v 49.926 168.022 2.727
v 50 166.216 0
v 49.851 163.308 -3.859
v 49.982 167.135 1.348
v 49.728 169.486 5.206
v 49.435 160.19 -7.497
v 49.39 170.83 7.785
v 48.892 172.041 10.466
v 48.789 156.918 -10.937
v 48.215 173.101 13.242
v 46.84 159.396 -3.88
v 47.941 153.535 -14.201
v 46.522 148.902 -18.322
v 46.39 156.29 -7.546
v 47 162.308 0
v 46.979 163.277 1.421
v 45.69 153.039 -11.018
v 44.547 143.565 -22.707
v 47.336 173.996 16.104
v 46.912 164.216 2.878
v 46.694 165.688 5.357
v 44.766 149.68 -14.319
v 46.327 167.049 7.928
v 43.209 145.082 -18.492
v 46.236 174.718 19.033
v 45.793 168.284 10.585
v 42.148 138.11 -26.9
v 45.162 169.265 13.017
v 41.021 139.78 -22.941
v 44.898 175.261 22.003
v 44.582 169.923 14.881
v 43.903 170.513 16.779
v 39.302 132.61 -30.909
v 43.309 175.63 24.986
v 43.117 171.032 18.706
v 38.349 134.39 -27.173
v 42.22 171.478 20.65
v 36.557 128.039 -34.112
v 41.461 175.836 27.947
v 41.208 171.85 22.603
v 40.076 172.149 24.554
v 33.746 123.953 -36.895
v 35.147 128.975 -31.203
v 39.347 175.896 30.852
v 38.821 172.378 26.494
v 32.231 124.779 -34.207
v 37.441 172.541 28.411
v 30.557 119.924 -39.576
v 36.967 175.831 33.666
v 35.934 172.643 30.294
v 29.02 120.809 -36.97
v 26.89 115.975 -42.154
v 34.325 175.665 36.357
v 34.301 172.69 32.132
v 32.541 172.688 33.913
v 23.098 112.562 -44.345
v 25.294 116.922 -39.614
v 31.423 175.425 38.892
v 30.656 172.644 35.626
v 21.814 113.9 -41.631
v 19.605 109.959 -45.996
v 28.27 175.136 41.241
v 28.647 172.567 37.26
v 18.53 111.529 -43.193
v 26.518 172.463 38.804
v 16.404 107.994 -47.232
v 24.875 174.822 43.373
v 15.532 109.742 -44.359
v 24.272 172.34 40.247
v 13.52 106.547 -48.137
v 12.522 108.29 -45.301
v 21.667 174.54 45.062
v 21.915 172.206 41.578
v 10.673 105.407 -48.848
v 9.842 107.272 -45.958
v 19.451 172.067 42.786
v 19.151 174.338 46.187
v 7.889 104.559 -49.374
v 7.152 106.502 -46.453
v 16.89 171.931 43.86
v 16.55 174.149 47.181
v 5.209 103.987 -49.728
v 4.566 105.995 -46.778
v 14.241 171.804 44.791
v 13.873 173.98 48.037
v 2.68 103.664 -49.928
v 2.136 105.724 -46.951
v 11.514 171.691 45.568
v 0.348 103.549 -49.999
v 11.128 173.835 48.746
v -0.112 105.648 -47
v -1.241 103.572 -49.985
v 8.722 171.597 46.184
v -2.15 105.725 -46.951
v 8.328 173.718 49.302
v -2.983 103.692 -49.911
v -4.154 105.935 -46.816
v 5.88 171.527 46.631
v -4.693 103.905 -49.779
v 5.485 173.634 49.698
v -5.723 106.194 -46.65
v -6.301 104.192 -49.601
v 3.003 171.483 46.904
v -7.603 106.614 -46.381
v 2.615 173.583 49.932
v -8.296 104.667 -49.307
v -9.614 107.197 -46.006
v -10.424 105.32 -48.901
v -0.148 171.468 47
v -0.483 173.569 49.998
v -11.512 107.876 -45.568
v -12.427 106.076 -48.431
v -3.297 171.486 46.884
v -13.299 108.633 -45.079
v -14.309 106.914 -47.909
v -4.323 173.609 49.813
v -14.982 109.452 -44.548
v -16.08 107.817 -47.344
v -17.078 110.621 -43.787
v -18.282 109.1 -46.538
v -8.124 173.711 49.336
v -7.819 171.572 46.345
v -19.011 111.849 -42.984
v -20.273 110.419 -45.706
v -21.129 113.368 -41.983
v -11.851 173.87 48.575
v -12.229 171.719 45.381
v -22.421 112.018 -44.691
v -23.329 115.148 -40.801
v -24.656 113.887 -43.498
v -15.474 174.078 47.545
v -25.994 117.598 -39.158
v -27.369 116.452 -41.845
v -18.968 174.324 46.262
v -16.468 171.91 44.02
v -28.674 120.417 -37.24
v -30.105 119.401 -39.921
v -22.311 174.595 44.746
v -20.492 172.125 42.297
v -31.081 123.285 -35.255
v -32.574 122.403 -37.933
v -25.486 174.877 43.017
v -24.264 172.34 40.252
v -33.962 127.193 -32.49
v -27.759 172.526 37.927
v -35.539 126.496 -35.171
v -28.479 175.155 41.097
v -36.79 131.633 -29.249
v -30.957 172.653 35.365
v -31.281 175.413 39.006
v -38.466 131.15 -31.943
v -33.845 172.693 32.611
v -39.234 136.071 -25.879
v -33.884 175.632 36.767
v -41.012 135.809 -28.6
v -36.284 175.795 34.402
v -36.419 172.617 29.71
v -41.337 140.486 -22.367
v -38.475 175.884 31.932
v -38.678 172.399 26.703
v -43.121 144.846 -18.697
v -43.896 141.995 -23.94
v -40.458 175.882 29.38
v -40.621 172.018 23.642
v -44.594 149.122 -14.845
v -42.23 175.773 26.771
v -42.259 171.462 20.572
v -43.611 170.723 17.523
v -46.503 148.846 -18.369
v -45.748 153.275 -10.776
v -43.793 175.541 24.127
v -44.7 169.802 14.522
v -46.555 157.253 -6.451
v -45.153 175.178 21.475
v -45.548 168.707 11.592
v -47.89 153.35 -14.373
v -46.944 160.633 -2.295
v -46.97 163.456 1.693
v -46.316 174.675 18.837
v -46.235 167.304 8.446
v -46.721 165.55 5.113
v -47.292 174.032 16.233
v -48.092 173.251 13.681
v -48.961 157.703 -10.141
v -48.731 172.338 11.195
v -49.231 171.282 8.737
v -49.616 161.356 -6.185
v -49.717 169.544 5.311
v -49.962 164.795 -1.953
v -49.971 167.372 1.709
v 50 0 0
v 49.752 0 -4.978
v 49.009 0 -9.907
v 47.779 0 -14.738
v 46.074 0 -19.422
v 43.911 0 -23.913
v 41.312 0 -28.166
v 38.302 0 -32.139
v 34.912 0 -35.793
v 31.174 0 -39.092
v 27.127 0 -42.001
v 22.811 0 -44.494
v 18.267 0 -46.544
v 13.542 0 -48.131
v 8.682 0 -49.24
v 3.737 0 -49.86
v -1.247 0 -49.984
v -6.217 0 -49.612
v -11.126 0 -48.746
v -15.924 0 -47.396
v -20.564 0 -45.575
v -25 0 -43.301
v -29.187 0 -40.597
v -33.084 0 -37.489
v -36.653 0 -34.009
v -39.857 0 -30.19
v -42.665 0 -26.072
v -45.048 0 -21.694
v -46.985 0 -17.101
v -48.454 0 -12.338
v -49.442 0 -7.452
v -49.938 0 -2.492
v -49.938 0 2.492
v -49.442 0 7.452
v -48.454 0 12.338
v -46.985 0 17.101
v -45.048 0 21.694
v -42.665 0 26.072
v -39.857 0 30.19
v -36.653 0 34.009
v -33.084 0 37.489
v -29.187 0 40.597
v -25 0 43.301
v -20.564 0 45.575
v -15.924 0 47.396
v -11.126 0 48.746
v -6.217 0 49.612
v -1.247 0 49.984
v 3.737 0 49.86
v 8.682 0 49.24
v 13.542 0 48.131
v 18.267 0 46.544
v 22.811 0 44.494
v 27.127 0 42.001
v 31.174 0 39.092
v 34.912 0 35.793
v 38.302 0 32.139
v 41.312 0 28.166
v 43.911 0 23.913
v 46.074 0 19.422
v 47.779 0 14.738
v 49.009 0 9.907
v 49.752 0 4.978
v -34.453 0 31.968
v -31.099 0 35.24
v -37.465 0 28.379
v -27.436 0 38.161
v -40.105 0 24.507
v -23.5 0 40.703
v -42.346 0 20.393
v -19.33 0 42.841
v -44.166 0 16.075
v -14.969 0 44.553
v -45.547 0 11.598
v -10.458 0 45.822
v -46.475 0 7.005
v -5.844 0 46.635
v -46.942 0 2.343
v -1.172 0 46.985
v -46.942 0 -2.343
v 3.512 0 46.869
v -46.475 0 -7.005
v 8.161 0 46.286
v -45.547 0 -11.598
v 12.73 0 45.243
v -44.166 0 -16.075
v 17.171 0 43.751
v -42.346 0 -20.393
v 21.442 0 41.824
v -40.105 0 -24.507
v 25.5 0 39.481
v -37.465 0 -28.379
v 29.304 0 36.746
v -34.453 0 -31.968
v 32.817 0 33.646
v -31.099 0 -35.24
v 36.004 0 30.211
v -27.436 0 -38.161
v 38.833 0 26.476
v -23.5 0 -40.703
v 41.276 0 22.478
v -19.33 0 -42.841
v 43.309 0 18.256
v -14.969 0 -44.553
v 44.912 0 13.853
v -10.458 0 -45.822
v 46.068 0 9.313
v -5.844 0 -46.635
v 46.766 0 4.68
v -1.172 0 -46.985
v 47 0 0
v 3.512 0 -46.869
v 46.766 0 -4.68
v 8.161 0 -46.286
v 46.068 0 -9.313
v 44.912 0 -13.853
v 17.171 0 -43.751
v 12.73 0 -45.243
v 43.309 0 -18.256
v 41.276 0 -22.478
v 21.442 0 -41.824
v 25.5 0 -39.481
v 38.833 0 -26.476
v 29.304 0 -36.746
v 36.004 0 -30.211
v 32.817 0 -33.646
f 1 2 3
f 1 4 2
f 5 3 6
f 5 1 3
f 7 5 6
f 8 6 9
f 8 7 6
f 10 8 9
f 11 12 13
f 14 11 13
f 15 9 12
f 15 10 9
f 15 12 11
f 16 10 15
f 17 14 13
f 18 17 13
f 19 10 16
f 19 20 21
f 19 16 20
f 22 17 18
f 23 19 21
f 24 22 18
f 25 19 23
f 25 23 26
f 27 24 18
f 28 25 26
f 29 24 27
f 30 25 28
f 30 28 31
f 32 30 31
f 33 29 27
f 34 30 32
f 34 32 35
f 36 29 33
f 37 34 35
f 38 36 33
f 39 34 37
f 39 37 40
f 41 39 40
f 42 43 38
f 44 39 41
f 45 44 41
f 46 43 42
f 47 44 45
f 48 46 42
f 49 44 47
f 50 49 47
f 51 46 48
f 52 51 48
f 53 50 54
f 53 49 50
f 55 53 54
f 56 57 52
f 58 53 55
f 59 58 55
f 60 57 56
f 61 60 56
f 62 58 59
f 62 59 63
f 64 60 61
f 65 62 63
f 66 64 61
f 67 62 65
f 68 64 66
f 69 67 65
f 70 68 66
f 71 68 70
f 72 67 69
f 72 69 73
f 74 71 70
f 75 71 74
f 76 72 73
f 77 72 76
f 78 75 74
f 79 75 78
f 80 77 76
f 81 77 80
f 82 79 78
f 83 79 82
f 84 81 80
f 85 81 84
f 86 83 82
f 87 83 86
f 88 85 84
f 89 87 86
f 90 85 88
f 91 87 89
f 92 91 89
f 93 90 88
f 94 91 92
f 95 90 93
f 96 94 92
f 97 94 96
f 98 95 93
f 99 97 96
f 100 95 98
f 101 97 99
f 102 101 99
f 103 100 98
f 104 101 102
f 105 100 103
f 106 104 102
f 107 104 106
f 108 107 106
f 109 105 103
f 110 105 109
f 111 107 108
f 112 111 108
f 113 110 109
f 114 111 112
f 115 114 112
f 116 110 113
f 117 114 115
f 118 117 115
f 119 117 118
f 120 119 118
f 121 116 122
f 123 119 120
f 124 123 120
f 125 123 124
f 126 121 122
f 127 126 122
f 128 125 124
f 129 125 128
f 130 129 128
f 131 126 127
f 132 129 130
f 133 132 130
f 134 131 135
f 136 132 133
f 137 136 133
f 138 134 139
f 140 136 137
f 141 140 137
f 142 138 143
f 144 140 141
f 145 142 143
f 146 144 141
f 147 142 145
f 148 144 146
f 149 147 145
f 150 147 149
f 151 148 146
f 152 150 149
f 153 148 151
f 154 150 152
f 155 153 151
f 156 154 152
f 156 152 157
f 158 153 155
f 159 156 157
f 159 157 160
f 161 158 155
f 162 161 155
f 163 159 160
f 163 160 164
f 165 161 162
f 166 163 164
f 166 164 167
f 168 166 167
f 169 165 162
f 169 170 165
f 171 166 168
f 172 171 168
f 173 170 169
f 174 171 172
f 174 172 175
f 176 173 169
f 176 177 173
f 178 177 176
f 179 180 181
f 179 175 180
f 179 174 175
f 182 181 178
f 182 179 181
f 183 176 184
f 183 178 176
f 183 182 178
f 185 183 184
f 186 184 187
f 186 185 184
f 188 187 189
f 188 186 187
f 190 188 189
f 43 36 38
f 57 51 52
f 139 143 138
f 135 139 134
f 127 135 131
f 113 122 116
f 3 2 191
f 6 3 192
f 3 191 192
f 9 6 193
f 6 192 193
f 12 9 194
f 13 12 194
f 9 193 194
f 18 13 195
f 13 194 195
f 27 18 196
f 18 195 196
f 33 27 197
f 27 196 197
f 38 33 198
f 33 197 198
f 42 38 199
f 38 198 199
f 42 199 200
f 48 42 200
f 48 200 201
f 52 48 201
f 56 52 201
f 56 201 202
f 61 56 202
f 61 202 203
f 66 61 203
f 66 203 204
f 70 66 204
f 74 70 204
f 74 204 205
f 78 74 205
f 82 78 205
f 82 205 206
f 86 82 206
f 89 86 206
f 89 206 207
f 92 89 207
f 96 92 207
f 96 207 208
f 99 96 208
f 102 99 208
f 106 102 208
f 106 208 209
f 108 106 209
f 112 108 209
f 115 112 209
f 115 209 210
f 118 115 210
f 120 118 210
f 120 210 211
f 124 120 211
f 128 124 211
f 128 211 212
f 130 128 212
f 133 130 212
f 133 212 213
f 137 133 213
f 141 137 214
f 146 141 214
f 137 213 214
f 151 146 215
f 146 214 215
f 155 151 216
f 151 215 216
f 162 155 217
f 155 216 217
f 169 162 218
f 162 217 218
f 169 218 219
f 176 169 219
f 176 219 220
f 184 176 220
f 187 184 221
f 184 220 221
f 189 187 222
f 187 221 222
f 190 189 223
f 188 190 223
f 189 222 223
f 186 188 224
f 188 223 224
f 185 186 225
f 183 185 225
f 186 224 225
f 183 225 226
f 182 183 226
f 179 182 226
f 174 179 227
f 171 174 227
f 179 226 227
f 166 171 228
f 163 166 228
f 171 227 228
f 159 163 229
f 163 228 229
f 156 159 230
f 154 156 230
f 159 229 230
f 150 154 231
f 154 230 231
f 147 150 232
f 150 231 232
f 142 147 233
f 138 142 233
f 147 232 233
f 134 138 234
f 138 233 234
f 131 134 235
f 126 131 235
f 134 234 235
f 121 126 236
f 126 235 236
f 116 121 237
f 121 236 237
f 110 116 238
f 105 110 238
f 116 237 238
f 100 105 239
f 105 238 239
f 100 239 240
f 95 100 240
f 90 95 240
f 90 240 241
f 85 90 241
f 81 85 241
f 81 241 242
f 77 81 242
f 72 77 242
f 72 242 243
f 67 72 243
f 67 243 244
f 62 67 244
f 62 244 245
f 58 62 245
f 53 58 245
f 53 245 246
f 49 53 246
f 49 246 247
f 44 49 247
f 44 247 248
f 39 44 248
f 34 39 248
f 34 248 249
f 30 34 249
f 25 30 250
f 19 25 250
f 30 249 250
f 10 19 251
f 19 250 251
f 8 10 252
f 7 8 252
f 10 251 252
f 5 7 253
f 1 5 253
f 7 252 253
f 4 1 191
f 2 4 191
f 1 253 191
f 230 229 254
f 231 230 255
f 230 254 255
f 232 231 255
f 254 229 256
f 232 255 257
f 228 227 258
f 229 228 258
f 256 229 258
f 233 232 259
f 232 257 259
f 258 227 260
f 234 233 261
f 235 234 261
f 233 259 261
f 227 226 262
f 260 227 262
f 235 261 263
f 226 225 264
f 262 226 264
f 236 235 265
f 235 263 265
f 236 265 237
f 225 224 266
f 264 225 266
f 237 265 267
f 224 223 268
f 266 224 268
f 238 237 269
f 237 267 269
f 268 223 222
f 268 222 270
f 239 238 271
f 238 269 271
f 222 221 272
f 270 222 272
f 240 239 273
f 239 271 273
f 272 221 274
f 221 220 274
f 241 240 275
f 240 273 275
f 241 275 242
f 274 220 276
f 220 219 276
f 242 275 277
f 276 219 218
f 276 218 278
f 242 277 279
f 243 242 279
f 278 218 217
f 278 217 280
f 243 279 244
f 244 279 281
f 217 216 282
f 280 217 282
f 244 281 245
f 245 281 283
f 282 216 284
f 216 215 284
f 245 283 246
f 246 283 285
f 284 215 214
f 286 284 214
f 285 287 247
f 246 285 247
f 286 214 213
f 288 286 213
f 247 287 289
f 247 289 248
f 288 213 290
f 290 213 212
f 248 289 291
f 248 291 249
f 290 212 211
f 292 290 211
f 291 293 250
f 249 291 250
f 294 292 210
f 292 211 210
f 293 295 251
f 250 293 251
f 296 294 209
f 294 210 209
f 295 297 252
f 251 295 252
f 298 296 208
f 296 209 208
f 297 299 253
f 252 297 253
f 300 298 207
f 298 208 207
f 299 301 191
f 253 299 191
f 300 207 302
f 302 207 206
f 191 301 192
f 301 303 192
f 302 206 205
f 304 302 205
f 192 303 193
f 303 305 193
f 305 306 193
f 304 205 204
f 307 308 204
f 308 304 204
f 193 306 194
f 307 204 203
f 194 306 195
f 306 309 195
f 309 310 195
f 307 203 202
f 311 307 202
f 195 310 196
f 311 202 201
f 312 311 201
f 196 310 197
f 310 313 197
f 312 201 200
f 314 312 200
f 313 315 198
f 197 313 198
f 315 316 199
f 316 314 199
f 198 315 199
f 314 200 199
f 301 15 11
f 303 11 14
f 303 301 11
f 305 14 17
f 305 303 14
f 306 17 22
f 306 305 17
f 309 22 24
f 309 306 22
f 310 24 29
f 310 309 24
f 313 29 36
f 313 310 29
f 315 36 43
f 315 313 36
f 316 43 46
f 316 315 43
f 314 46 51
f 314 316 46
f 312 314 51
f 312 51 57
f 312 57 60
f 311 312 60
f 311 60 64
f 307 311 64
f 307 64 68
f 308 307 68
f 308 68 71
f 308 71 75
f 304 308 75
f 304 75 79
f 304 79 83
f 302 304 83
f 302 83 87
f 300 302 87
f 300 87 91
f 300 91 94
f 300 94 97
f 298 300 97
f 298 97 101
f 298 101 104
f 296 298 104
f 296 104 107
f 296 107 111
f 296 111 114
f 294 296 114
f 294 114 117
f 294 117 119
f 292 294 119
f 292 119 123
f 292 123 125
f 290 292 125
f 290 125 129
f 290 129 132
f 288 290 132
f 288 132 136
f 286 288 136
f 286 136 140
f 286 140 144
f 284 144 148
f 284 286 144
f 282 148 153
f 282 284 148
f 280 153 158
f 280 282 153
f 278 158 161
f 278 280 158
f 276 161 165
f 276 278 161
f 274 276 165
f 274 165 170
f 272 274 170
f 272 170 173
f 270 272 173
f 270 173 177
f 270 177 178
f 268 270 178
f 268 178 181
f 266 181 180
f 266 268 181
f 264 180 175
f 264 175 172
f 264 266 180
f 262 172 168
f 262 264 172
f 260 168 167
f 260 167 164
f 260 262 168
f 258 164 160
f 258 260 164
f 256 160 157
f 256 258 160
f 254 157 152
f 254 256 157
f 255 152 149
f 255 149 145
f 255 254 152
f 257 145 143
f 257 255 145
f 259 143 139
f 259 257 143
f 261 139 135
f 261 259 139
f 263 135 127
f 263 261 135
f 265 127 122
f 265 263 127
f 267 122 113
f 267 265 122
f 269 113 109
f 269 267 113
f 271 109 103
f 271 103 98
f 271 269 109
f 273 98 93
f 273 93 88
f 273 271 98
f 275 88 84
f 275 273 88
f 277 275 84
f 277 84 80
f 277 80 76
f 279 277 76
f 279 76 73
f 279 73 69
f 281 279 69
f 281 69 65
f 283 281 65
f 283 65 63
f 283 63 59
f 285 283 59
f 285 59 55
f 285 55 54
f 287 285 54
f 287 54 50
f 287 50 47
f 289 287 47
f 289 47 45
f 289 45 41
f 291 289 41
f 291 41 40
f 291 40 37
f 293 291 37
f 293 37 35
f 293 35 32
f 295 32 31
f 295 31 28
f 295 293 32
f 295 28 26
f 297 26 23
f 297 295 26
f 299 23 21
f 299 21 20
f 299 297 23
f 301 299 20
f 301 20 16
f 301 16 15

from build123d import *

# Parameters (mm, degrees)
EXTRUDE_1_OUTLINE_R      = 50
EXTRUDE_1_OUTLINE_R_2    = 47
EXTRUDE_1_DEPTH          = 200
CUT_EXTRUDE_1_DEPTH      = 213.132034356
CUT_EXTRUDE_1_DEPTH_BACK = 213.132034356
SKETCH_2_R               = 66.5


# Read off the part's stored shape, not the designer's step: Вытянуть-Тонкостенный1
with BuildPart() as part:
    # Вытянуть-Тонкостенный1 outline → Вытянуть-Тонкостенный1 (new body)
    with BuildSketch(Plane(origin=(0, 0, 0), x_dir=(1, 0, 0), z_dir=(0, 1, 0))):
        Circle(EXTRUDE_1_OUTLINE_R)
        Circle(EXTRUDE_1_OUTLINE_R_2, mode=Mode.SUBTRACT)
    extrude(amount=EXTRUDE_1_DEPTH)

    # Эскиз2 → Вырез-Вытянуть1 (cut, two sides: drawn at the far end of the back side and taken through both)
    with BuildSketch(Plane(origin=(0, 0, 0), x_dir=(1, 0, 0), z_dir=(0, -0.5735764363510444, -0.819152044288993)).offset(-CUT_EXTRUDE_1_DEPTH_BACK)):
        with Locations((0, -180)):
            Circle(SKETCH_2_R)
    extrude(amount=CUT_EXTRUDE_1_DEPTH + CUT_EXTRUDE_1_DEPTH_BACK, mode=Mode.SUBTRACT)


solid = part.part
